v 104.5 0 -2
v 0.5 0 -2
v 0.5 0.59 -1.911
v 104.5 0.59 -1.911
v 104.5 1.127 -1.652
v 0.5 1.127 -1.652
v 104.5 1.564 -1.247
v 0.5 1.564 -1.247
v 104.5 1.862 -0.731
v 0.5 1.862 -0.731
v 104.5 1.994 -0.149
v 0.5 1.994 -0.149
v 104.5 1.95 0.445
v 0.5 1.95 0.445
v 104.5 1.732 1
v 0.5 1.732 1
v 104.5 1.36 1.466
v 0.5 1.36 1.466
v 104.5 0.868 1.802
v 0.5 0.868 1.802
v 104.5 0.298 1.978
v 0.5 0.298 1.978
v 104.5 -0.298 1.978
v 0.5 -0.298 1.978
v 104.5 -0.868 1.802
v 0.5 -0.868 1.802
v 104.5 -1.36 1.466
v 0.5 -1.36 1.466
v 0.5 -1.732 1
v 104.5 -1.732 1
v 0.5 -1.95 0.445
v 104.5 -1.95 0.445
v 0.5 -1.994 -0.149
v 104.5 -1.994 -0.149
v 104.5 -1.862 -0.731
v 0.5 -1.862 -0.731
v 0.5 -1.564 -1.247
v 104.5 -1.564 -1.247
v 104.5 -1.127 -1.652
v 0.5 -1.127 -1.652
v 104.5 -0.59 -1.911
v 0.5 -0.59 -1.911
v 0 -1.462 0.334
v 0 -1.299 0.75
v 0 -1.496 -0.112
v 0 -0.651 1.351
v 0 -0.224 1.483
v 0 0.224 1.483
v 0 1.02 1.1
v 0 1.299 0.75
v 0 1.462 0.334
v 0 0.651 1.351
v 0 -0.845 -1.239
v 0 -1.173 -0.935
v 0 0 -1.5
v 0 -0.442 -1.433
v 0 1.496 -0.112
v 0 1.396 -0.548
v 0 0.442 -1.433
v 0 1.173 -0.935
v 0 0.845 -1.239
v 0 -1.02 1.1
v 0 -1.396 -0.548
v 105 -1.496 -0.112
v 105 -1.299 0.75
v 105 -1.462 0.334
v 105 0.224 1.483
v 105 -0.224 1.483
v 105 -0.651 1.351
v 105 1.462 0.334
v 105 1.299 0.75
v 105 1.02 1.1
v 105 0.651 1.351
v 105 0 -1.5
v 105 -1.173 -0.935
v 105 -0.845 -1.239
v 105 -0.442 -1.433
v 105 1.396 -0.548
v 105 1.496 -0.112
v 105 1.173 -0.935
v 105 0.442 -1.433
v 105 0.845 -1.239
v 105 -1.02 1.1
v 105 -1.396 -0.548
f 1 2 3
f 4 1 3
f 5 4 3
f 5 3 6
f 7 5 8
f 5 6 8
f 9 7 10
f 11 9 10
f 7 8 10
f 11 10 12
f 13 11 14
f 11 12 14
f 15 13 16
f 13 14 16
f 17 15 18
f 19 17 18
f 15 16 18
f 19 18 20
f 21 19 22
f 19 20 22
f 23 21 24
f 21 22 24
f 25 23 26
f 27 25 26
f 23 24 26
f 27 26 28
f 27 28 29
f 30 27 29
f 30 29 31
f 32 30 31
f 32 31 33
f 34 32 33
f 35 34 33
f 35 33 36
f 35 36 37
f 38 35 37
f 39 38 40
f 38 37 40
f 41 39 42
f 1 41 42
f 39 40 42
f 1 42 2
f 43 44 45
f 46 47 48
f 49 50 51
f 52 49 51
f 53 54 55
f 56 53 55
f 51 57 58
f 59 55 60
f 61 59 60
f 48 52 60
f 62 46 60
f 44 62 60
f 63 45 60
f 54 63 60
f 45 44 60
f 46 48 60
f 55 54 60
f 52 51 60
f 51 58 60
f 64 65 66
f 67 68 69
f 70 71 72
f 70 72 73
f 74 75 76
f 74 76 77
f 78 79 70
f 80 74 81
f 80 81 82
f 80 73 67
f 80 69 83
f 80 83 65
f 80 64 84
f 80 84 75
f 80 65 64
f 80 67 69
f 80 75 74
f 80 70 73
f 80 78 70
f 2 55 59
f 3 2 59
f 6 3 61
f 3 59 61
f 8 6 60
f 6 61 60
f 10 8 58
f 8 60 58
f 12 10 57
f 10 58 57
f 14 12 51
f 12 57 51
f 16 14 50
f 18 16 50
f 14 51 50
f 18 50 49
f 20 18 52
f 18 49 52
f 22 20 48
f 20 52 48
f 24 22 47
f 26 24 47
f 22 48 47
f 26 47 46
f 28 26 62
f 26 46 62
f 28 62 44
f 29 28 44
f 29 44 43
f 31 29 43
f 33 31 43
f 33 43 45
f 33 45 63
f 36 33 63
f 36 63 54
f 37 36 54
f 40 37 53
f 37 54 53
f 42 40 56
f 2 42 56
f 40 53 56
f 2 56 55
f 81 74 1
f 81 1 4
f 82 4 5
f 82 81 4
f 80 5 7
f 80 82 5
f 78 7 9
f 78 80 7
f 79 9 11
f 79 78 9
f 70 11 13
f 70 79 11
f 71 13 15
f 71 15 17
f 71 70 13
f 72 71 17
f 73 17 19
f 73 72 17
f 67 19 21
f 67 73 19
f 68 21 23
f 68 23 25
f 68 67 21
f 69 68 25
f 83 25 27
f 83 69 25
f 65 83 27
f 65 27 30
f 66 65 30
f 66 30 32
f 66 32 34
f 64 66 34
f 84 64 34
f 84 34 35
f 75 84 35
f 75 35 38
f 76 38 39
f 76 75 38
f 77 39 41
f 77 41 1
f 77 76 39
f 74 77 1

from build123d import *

# Parameters (mm, degrees)
SKETCH1_R           = 2
BOSS_EXTRUDE1_DEPTH = 105
CHAMFER1_SIZE       = 0.5
CHAMFER2_SIZE       = 0.5


with BuildPart() as part:
    # Sketch1 → Boss-Extrude1 (new body)
    with BuildSketch(Plane(origin=(0, 0, 0), x_dir=(0, 0, -1), z_dir=(1, 0, 0))):
        Circle(SKETCH1_R)
    extrude(amount=BOSS_EXTRUDE1_DEPTH)

    # Chamfer1
    chamfer1_edges = [part.edges().sort_by_distance(p)[0] for p in [
        (0, 0, 2),
    ]]
    chamfer(chamfer1_edges, length=CHAMFER1_SIZE)

    # Chamfer2
    chamfer2_edges = [part.edges().sort_by_distance(p)[0] for p in [
        (105, 0, 2),
    ]]
    chamfer(chamfer2_edges, length=CHAMFER2_SIZE)


solid = part.part
